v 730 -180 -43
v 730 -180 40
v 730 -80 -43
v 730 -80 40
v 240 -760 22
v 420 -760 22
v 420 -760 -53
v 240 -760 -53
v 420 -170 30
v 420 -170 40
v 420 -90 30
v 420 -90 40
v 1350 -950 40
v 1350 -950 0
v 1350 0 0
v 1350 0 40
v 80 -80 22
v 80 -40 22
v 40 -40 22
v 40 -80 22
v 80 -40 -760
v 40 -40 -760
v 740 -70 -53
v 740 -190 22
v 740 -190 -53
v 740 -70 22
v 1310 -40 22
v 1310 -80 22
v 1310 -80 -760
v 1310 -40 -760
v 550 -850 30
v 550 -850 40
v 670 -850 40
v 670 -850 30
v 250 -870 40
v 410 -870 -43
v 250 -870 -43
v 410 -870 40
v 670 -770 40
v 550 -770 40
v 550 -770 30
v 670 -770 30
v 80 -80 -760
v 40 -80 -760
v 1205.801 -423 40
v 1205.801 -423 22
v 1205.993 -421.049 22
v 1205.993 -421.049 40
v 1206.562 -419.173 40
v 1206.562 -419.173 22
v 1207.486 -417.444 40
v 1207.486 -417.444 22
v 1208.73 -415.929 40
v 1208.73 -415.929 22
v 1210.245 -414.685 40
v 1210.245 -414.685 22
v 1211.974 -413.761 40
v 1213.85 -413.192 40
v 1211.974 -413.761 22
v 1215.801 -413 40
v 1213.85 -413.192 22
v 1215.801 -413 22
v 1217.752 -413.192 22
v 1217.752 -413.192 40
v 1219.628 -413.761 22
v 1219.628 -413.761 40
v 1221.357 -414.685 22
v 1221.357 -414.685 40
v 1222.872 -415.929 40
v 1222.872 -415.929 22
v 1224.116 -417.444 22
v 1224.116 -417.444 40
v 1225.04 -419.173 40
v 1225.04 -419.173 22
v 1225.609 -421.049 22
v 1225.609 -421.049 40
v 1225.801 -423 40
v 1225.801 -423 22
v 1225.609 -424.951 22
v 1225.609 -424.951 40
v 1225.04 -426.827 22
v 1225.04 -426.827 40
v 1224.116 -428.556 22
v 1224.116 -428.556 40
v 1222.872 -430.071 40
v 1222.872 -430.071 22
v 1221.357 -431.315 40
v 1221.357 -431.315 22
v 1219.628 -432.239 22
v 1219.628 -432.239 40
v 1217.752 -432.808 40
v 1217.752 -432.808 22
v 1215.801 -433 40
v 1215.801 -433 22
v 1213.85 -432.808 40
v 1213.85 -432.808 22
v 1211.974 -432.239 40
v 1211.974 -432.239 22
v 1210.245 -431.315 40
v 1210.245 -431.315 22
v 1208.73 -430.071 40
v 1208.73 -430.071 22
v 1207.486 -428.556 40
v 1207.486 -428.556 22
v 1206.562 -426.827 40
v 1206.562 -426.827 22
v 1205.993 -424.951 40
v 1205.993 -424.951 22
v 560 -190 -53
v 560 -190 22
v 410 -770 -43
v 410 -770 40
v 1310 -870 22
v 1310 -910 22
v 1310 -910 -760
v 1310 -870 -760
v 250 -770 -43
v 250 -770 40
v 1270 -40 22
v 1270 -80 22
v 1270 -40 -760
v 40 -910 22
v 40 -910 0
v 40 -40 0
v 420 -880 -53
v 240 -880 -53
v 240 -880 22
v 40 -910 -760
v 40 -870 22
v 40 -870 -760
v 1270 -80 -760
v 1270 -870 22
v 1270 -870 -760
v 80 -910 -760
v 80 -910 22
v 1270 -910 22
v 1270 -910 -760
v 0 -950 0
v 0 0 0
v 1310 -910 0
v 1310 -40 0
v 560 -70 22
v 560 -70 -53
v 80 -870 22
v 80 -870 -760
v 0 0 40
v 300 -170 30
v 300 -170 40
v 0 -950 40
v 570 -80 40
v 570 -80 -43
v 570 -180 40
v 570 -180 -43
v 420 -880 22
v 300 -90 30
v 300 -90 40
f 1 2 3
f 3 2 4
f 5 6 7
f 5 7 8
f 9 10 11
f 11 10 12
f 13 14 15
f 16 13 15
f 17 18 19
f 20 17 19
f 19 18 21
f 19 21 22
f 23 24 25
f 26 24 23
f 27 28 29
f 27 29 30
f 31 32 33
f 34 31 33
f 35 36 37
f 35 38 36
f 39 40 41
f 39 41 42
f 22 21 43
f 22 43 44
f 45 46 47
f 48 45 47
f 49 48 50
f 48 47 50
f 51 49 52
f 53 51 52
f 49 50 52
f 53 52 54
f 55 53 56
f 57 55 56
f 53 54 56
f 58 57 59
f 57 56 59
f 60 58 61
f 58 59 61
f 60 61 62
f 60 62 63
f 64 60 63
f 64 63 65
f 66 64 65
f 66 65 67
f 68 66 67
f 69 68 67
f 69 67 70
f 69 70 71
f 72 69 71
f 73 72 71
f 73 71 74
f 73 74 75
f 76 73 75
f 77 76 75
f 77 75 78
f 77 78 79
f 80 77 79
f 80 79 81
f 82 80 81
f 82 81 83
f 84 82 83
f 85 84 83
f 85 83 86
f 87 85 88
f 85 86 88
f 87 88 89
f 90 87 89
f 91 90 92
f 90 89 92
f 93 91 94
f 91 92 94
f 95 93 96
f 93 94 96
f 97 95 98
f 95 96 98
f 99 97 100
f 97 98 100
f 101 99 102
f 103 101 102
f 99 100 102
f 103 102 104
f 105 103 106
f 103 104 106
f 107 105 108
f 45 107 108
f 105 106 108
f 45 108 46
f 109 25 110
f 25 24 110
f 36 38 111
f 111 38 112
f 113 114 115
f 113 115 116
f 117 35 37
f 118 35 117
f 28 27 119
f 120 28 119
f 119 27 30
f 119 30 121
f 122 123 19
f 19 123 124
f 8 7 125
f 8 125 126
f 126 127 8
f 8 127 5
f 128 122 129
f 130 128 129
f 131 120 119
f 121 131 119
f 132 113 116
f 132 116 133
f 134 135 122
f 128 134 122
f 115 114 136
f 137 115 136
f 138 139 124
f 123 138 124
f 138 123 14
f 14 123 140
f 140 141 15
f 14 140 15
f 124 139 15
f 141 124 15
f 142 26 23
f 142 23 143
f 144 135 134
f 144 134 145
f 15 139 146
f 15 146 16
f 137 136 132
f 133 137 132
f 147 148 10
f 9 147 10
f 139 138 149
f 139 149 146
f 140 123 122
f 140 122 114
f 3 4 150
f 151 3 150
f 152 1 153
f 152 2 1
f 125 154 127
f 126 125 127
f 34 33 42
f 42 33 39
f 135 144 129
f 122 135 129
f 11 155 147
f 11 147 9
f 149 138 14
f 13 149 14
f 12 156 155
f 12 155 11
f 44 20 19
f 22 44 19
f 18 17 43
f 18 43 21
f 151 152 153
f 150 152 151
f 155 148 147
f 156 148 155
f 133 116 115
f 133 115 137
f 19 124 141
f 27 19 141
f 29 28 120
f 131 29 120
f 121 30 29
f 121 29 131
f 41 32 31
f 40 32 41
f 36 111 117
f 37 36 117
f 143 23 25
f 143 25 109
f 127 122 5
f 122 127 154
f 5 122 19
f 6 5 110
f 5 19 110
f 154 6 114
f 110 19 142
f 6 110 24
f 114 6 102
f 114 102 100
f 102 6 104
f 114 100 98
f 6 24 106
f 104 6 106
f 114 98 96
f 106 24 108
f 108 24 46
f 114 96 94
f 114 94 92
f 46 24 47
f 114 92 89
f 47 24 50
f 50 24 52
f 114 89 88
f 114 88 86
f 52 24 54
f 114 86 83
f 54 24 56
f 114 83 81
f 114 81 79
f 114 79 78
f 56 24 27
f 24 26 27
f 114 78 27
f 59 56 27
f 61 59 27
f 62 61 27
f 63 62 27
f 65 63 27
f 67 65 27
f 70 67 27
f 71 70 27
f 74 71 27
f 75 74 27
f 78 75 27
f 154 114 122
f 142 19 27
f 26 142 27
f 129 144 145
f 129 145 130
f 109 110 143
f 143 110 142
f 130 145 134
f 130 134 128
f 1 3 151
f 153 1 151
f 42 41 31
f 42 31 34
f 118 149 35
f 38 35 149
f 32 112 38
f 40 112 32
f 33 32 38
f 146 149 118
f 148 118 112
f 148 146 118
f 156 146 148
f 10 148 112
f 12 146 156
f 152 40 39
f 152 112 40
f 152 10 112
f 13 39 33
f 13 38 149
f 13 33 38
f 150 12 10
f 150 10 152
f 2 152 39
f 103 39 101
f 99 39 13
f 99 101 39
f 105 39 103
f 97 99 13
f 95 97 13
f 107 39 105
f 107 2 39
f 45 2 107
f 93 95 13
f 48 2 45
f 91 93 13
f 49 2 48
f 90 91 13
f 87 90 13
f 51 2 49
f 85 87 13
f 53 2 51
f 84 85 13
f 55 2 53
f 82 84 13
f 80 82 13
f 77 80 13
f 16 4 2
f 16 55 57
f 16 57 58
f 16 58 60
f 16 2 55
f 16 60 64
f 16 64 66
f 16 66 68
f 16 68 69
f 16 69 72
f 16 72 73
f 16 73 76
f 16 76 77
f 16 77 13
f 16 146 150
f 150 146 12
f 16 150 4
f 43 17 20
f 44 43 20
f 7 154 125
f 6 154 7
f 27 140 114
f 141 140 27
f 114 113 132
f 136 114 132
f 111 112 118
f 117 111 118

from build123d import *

# Parameters (mm, degrees)
ESQUISSE1_W               = 1350
ESQUISSE1_H               = 950
ESQUISSE1_W_2             = 1270
ESQUISSE1_H_2             = 870
BOSS_EXTRU_1_DEPTH        = 40
BOSS_EXTRU_2_DEPTH        = 760
BOSS_EXTRU_2_DEPTH_BACK   = 22
ESQUISSE2_W               = 40
ESQUISSE2_H               = 40
BOSS_EXTRU_2_2_DEPTH      = 760
BOSS_EXTRU_2_2_DEPTH_BACK = 22
BOSS_EXTRU_2_3_DEPTH      = 760
BOSS_EXTRU_2_3_DEPTH_BACK = 22
BOSS_EXTRU_2_4_DEPTH      = 760
BOSS_EXTRU_2_4_DEPTH_BACK = 22
ESQUISSE3_W               = 1270
ESQUISSE3_H               = 870
BOSS_EXTRU_3_DEPTH        = 18
ESQUISSE4_W               = 160
ESQUISSE4_H               = 100
ENL_V_MAT_EXTRU_1_DEPTH   = 1835.393632784
ESQUISSE5_W               = 180
ESQUISSE5_H               = 120
ESQUISSE5_W_2             = 160
ESQUISSE5_H_2             = 100
BOSS_EXTRU_4_DEPTH        = 65
ESQUISSE6_W               = 180
ESQUISSE6_H               = 120
BOSS_EXTRU_5_DEPTH        = 10
ESQUISSE7_W               = 120
ESQUISSE7_H               = 80
ENL_V_MAT_EXTRU_2_DEPTH   = 10
ESQUISSE8_R               = 10
ENL_V_MAT_EXTRU_3_DEPTH   = 1827.615449404


with BuildPart() as part:
    # Esquisse1 → Boss.-Extru.1 (new body)
    with BuildSketch(Plane.XY):
        with Locations((675, -475)):
            Rectangle(ESQUISSE1_W, ESQUISSE1_H)
        with Locations((675, -475)):
            Rectangle(ESQUISSE1_W_2, ESQUISSE1_H_2, mode=Mode.SUBTRACT)
    extrude(amount=BOSS_EXTRU_1_DEPTH)



with BuildPart() as body_2:
    # Esquisse2 → Boss.-Extru.2 (new, two sides: drawn at the far end of the back side and taken through both)
    with BuildSketch(Plane(origin=(0, 0, 0), x_dir=(-1, 0, 0), z_dir=(0, 0, -1)).offset(-BOSS_EXTRU_2_DEPTH_BACK)):
        with Locations((-1290, -60)):
            Rectangle(ESQUISSE2_W, ESQUISSE2_H)
    extrude(amount=BOSS_EXTRU_2_DEPTH + BOSS_EXTRU_2_DEPTH_BACK)


with BuildPart() as body_3:
    # Esquisse2 → Boss.-Extru.2 2 (new, two sides: drawn at the far end of the back side and taken through both)
    with BuildSketch(Plane(origin=(0, 0, 0), x_dir=(-1, 0, 0), z_dir=(0, 0, -1)).offset(-BOSS_EXTRU_2_2_DEPTH_BACK)):
        with Locations((-60, -60)):
            Rectangle(ESQUISSE2_W, ESQUISSE2_H)
    extrude(amount=BOSS_EXTRU_2_2_DEPTH + BOSS_EXTRU_2_2_DEPTH_BACK)


with BuildPart() as body_4:
    # Esquisse2 → Boss.-Extru.2 3 (new, two sides: drawn at the far end of the back side and taken through both)
    with BuildSketch(Plane(origin=(0, 0, 0), x_dir=(-1, 0, 0), z_dir=(0, 0, -1)).offset(-BOSS_EXTRU_2_3_DEPTH_BACK)):
        with Locations((-60, -890)):
            Rectangle(ESQUISSE2_W, ESQUISSE2_H)
    extrude(amount=BOSS_EXTRU_2_3_DEPTH + BOSS_EXTRU_2_3_DEPTH_BACK)


with BuildPart() as body_5:
    # Esquisse2 → Boss.-Extru.2 4 (new, two sides: drawn at the far end of the back side and taken through both)
    with BuildSketch(Plane(origin=(0, 0, 0), x_dir=(-1, 0, 0), z_dir=(0, 0, -1)).offset(-BOSS_EXTRU_2_4_DEPTH_BACK)):
        with Locations((-1290, -890)):
            Rectangle(ESQUISSE2_W, ESQUISSE2_H)
    extrude(amount=BOSS_EXTRU_2_4_DEPTH + BOSS_EXTRU_2_4_DEPTH_BACK)


with BuildPart() as body_6:
    # Esquisse3 → Boss.-Extru.3 (new body)
    with BuildSketch(Plane.XY.offset(22)):
        with Locations((675, -475)):
            Rectangle(ESQUISSE3_W, ESQUISSE3_H)
    extrude(amount=BOSS_EXTRU_3_DEPTH)

    # Esquisse4 → Enlèv. mat.-Extru.1 (cut, through all)
    with BuildSketch(Plane.XY.offset(40)):
        with Locations((330, -820)):
            Rectangle(ESQUISSE4_W, ESQUISSE4_H)
        with Locations((650, -130)):
            Rectangle(ESQUISSE4_W, ESQUISSE4_H)
    extrude(amount=-ENL_V_MAT_EXTRU_1_DEPTH, mode=Mode.SUBTRACT)


with BuildPart() as part_1:
    add(part.part)

    add(body_6.part)  # Boss.-Extru.4 merges body 6
    # Esquisse5 → Boss.-Extru.4 (add)
    # profile 1 of 2: a face of its own
    with BuildSketch(Plane(origin=(0, 0, 22), x_dir=(-1, 0, 0), z_dir=(0, 0, -1))):
        with Locations((-330, -820)):
            Rectangle(ESQUISSE5_W, ESQUISSE5_H)
        with Locations((-330, -820)):
            Rectangle(ESQUISSE5_W_2, ESQUISSE5_H_2, mode=Mode.SUBTRACT)
    # profile 2 of 2: a face of its own
    with BuildSketch(Plane(origin=(0, 0, 22), x_dir=(-1, 0, 0), z_dir=(0, 0, -1))):
        with Locations((-650, -130)):
            Rectangle(ESQUISSE5_W, ESQUISSE5_H)
        with Locations((-650, -130)):
            Rectangle(ESQUISSE5_W_2, ESQUISSE5_H_2, mode=Mode.SUBTRACT)
    extrude(amount=BOSS_EXTRU_4_DEPTH)

    # Esquisse6 → Boss.-Extru.5 (add)
    with BuildSketch(Plane(origin=(0, 0, -43), x_dir=(-1, 0, 0), z_dir=(0, 0, -1))):
        with Locations((-650, -130)):
            Rectangle(ESQUISSE6_W, ESQUISSE6_H)
        with Locations((-330, -820)):
            Rectangle(ESQUISSE6_W, ESQUISSE6_H)
    extrude(amount=BOSS_EXTRU_5_DEPTH)

    # Esquisse7 → Enlèv. mat.-Extru.2 (cut)
    with BuildSketch(Plane.XY.offset(40)):
        with Locations((360, -130)):
            Rectangle(ESQUISSE7_W, ESQUISSE7_H)
        with Locations((610, -810)):
            Rectangle(ESQUISSE7_W, ESQUISSE7_H)
    extrude(amount=-ENL_V_MAT_EXTRU_2_DEPTH, mode=Mode.SUBTRACT)

    # Esquisse8 → Enlèv. mat.-Extru.3 (cut, through all)
    with BuildSketch(Plane(origin=(0, 0, 22), x_dir=(-1, 0, 0), z_dir=(0, 0, -1))):
        with Locations((-1215.801110786, -423)):
            Circle(ESQUISSE8_R)
    extrude(amount=-ENL_V_MAT_EXTRU_3_DEPTH, mode=Mode.SUBTRACT)


solid = Compound([body_2.part, body_3.part, body_4.part, body_5.part, part_1.part])
